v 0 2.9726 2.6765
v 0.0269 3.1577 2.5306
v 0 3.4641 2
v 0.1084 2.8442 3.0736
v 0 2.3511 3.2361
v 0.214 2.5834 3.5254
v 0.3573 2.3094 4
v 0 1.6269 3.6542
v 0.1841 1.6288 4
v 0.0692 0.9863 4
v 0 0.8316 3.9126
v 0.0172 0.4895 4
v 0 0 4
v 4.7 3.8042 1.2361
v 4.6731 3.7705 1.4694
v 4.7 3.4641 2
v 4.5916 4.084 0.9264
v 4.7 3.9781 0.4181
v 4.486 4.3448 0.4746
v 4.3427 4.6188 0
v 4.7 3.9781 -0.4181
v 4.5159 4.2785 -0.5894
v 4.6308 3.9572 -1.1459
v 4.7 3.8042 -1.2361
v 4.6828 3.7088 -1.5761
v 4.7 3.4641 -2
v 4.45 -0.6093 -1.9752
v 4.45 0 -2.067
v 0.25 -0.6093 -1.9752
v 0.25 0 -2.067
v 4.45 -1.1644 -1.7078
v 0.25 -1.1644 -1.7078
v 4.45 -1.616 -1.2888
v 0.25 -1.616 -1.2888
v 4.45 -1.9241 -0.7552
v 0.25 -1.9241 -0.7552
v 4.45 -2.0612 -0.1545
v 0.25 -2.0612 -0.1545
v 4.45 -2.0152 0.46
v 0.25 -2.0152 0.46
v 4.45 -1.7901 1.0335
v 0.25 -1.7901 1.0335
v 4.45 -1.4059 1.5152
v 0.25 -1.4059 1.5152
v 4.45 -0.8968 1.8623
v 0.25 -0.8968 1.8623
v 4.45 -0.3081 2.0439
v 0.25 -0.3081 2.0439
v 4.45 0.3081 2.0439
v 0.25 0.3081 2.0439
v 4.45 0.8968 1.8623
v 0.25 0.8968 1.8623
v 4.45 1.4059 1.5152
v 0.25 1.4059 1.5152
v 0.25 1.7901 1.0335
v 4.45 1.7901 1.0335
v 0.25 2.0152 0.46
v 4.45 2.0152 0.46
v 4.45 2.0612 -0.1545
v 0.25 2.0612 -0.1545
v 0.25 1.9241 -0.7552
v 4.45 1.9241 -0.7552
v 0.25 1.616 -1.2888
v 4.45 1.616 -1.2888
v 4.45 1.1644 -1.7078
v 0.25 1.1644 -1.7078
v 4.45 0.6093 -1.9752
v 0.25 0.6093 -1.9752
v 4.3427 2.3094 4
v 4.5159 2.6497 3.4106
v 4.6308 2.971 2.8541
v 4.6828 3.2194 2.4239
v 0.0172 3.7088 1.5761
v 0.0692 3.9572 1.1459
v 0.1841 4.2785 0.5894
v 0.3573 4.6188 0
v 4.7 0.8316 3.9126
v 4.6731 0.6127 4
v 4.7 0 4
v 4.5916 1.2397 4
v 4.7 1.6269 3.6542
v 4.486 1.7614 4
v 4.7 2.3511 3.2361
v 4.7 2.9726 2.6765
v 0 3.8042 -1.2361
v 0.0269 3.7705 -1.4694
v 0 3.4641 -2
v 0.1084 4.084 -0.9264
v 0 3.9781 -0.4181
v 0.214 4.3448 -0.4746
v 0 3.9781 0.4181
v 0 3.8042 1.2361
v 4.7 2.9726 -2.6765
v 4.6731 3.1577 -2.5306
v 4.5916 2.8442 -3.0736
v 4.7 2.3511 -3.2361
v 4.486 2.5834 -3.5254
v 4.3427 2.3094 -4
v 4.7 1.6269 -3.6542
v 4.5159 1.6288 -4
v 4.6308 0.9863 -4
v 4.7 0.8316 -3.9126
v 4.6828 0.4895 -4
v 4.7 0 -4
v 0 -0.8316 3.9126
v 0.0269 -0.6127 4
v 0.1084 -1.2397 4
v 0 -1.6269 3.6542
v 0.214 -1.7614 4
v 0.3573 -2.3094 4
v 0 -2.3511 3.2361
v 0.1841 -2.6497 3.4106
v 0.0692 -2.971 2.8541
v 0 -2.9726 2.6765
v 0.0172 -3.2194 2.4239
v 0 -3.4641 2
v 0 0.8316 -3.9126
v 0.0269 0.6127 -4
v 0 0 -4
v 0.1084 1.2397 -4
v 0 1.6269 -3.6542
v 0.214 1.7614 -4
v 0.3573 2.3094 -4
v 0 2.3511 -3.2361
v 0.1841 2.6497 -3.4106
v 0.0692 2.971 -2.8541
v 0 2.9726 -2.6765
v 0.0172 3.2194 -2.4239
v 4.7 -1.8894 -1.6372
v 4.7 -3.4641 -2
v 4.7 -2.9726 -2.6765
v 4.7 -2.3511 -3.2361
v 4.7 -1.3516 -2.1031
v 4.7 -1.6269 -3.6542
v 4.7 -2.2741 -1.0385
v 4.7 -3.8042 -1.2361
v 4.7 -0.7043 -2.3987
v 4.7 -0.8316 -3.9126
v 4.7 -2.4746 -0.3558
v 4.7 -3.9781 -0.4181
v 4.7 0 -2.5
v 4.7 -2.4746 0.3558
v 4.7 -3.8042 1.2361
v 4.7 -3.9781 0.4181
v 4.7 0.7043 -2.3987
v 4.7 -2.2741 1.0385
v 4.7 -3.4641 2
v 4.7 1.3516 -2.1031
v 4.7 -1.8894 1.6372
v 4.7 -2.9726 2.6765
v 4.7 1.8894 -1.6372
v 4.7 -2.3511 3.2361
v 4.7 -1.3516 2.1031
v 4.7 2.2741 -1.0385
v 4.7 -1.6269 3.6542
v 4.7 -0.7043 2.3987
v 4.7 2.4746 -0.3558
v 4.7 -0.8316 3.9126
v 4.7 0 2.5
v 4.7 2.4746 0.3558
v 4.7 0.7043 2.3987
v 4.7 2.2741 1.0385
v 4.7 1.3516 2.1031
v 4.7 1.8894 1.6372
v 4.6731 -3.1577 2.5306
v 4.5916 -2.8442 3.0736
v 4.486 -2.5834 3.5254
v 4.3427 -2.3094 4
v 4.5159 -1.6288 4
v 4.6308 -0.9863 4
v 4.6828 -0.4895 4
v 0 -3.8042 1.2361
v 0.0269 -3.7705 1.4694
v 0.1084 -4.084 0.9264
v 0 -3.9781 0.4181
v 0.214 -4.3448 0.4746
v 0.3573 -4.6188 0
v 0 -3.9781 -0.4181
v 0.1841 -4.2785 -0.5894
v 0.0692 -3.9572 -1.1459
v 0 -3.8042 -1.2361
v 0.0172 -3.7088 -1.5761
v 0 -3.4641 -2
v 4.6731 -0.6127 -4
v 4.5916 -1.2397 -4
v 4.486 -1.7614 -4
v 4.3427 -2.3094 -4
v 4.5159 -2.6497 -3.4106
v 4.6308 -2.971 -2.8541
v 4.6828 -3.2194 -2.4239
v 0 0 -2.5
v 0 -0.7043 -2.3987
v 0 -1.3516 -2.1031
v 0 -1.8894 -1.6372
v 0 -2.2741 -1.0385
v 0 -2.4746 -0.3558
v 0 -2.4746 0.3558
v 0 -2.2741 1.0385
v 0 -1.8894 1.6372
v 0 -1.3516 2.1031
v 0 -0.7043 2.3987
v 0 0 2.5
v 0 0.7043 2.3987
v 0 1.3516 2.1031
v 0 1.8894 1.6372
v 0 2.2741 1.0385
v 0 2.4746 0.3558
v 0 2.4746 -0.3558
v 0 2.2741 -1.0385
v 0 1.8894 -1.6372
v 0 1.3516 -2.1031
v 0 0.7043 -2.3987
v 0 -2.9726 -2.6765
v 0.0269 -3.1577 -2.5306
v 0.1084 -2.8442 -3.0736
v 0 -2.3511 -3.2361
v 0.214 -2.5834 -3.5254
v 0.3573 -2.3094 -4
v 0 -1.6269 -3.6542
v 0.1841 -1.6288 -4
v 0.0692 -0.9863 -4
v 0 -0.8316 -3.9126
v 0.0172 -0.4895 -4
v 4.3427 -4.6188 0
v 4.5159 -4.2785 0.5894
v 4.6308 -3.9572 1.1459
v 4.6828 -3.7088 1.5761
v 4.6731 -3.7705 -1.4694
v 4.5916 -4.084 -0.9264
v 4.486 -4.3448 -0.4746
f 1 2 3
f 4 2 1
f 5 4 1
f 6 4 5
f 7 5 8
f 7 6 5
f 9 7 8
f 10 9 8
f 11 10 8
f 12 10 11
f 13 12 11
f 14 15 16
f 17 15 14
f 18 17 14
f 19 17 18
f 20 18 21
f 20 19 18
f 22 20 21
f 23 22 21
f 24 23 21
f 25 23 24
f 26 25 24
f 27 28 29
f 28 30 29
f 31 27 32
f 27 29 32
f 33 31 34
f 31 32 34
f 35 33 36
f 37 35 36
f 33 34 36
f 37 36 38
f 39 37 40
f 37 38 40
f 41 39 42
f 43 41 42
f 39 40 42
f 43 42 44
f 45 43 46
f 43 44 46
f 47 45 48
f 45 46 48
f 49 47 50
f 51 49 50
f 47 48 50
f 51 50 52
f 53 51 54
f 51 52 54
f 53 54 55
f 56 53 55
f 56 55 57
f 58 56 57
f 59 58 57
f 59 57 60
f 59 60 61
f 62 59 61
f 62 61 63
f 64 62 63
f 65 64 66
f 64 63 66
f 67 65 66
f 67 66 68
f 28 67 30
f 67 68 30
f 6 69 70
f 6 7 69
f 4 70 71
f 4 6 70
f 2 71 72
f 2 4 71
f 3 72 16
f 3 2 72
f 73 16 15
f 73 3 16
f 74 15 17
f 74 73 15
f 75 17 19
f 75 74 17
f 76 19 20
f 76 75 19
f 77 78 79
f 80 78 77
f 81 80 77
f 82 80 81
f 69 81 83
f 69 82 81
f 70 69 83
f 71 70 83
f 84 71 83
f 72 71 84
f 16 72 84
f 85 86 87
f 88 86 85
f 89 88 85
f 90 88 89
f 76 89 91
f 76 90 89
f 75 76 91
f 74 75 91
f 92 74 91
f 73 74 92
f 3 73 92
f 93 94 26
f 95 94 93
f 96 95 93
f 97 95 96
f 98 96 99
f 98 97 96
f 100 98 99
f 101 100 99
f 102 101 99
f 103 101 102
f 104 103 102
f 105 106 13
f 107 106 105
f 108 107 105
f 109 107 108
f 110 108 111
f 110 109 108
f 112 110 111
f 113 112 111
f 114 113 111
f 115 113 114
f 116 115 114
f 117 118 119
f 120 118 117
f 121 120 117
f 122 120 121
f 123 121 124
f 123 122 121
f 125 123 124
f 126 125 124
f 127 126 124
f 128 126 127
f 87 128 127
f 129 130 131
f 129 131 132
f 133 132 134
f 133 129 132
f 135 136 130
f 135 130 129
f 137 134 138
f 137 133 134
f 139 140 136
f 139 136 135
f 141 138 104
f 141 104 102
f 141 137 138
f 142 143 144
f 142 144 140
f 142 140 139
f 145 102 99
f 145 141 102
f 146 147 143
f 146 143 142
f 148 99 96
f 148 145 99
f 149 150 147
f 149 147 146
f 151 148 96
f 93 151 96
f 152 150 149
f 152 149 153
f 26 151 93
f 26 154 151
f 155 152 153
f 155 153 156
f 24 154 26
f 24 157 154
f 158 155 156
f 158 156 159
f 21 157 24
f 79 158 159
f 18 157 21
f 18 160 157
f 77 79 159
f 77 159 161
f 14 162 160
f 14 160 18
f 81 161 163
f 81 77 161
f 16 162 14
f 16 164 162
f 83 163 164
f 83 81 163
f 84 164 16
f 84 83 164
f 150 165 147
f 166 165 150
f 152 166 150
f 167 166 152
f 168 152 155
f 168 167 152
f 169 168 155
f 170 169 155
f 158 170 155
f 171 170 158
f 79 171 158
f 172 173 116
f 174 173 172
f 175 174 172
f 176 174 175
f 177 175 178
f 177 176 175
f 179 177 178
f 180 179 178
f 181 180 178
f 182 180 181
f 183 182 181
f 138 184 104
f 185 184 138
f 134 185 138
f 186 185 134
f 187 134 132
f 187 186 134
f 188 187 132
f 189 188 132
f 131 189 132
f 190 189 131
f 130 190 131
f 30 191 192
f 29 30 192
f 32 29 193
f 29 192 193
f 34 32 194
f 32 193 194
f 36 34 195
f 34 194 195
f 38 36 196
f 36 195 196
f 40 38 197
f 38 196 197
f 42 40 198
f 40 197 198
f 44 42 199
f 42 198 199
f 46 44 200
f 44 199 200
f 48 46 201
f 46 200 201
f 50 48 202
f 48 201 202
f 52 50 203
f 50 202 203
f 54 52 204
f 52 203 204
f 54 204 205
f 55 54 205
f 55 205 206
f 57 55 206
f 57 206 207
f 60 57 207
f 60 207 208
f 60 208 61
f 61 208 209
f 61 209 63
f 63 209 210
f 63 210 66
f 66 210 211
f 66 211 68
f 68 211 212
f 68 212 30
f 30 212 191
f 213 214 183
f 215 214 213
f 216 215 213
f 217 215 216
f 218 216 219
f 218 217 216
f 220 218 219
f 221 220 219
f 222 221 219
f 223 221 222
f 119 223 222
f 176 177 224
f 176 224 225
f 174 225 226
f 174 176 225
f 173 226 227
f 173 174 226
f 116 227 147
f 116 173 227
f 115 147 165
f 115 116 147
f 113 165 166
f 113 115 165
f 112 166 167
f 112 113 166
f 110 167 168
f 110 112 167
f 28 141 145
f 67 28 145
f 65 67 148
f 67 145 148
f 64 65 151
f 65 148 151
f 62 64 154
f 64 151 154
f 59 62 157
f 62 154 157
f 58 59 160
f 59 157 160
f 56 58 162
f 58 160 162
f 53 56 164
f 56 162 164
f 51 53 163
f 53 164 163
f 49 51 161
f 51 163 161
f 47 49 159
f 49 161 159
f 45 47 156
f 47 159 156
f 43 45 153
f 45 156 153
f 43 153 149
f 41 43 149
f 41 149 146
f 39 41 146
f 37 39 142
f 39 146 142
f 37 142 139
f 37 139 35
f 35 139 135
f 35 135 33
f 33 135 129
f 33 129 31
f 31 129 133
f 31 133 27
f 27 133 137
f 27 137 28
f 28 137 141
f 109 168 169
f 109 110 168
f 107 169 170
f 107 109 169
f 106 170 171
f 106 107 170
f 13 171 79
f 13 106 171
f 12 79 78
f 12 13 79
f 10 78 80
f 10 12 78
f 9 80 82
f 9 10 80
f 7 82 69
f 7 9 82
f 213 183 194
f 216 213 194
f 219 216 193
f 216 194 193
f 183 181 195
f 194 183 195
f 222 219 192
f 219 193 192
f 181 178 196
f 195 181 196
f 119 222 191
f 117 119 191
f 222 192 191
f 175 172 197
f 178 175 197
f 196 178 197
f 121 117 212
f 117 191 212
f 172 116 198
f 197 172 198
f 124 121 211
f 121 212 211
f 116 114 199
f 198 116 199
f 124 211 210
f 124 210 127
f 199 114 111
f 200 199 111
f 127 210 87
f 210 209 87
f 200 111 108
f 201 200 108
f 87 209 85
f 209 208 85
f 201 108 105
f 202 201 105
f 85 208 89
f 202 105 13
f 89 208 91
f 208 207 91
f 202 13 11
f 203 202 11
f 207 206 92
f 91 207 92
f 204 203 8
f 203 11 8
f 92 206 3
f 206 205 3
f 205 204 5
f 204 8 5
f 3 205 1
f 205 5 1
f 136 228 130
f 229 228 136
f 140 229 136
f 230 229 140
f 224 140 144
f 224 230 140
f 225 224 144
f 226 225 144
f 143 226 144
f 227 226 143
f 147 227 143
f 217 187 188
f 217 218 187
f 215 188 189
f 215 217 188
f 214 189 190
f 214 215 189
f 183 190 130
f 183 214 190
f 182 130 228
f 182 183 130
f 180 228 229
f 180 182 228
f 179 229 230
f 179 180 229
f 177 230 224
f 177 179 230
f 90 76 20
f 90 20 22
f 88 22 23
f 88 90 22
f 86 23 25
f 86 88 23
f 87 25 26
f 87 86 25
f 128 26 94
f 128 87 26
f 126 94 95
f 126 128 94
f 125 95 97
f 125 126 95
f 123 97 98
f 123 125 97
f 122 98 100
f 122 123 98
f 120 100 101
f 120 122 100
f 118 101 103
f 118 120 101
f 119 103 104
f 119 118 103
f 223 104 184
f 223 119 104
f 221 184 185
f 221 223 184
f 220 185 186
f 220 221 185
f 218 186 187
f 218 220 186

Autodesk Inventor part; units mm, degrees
ref_plane "YZ Plane" through (0, 0, 0) normal (1, 0, 0) x (0, 1, 0)
ref_plane "XZ Plane" through (0, 0, 0) normal (0, 1, 0) x (-1, 0, 0)
sketch "Sketch1" plane through (0, 0, 0) normal (1, 0, 0) x (0, 1, 0)
  line L0 (-4.6188, 0) -> (-2.3094, 4)
  line L1 (-2.3094, 4) -> (2.3094, 4)
  line L2 (2.3094, 4) -> (4.6188, 0)
  line L3 (4.6188, 0) -> (2.3094, -4)
  line L4 (2.3094, -4) -> (-2.3094, -4)
  line L5 (-2.3094, -4) -> (-4.6188, 0)
  point P0 (0, 0)
  point P1 (0, 0)
  dimension "d0" = 9.2376
extrude "Body" add sketch "Sketch1" along normal blind 4.7
sketch "Sketch2" plane through (0, 0, 0) normal (0, 0, 1) x (1, 0, 0)
  line L0 (0, 2.3094) -> (0, 4.6188) projected
  line L1 (0, 4.6188) -> (4.7, 4.6188) projected
  line L2 (4.7, 2.3094) -> (4.7, 4.6188) projected
  line L3 (-0.94, 0) -> (5.64, 0) projected
  line L4 (0.3573, 4.6188) -> (0, 4)
  line L5 (4.3427, 4.6188) -> (4.7, 4)
  dimension "d3" = 30
  dimension "d4" = 30
  dimension "d5" = 8
  dimension "d6" = 8
revolve "Chamfer1" cut sketch "Sketch2" angle 360 about axis through (-10, 0, 0) along (1, 0, 0)
sketch "Sketch3" plane through (4.7, 0, 0) normal (1, 0, 0) x (0, 0, -1)
  arc A0 (-2, -3.4641) -> (2, -3.4641) centre (0, 0) ccw projected
hole "Thread" at (4.7, 0, 0) direction (-1, 0, 0) diameter 4.134 end through all thread size "M5x0.8" class "6H" standard "ISO Metric profile"
chamfer "Chamfer2" distance 0.433 angle 30 1 edges at (4.7, 0, 2.067) measured on face at (4.7, 3.336, -0.083)
chamfer "Chamfer3" distance 0.433 angle 30 1 edges at (0, 0, 2.067) measured on face at (0, 3.336, -0.083)
ref_plane "Work Plane1" through (-8.3929, 0, 0) normal (0, -0.866, -0.5) x (1, 0, 0)
equation "\"d0\" = 1.1547 * SW"
equation "\"d1\" = KOH"
equation "\"d3\" = ANG1"
equation "\"d4\" = ANG2"
equation "\"d5\" = SW0"
equation "\"d6\" = SW01"
equation "\"d8\" = -0.5 * GD1 + 0.5 * NND"
equation "\"d40\" = -0.5 * GD1 + 0.5 * NND"
equation "\"d10\" = -0.5 * GD1 + 0.5 * NND"
equation "\"d41\" = -0.5 * GD1 + 0.5 * NND"
equation "\"ANG1\" = 30deg"
equation "\"ANG2\" = 30deg"
equation "\"NND\" = 5"
equation "\"KOH\" = 4.7"
equation "\"SW\" = 8"
equation "\"SW0\" = SW"
equation "\"SW01\" = SW"
equation "\"GUL\" = 0.541266 * PTC"
equation "\"WFT\" = 0.5"
equation "\"THREADDIA\" = 5"
equation "\"TOA\" = 30deg"
equation "\"PTC\" = 0.8"
equation "\"E0\" = 1.155 * SW"
equation "\"GAL\" = 0.541266 * PTC"
equation "\"GD1\" = 4.133975"
properties part number "AS 1112 - M5  Type 5" material "Steel, Mild"
